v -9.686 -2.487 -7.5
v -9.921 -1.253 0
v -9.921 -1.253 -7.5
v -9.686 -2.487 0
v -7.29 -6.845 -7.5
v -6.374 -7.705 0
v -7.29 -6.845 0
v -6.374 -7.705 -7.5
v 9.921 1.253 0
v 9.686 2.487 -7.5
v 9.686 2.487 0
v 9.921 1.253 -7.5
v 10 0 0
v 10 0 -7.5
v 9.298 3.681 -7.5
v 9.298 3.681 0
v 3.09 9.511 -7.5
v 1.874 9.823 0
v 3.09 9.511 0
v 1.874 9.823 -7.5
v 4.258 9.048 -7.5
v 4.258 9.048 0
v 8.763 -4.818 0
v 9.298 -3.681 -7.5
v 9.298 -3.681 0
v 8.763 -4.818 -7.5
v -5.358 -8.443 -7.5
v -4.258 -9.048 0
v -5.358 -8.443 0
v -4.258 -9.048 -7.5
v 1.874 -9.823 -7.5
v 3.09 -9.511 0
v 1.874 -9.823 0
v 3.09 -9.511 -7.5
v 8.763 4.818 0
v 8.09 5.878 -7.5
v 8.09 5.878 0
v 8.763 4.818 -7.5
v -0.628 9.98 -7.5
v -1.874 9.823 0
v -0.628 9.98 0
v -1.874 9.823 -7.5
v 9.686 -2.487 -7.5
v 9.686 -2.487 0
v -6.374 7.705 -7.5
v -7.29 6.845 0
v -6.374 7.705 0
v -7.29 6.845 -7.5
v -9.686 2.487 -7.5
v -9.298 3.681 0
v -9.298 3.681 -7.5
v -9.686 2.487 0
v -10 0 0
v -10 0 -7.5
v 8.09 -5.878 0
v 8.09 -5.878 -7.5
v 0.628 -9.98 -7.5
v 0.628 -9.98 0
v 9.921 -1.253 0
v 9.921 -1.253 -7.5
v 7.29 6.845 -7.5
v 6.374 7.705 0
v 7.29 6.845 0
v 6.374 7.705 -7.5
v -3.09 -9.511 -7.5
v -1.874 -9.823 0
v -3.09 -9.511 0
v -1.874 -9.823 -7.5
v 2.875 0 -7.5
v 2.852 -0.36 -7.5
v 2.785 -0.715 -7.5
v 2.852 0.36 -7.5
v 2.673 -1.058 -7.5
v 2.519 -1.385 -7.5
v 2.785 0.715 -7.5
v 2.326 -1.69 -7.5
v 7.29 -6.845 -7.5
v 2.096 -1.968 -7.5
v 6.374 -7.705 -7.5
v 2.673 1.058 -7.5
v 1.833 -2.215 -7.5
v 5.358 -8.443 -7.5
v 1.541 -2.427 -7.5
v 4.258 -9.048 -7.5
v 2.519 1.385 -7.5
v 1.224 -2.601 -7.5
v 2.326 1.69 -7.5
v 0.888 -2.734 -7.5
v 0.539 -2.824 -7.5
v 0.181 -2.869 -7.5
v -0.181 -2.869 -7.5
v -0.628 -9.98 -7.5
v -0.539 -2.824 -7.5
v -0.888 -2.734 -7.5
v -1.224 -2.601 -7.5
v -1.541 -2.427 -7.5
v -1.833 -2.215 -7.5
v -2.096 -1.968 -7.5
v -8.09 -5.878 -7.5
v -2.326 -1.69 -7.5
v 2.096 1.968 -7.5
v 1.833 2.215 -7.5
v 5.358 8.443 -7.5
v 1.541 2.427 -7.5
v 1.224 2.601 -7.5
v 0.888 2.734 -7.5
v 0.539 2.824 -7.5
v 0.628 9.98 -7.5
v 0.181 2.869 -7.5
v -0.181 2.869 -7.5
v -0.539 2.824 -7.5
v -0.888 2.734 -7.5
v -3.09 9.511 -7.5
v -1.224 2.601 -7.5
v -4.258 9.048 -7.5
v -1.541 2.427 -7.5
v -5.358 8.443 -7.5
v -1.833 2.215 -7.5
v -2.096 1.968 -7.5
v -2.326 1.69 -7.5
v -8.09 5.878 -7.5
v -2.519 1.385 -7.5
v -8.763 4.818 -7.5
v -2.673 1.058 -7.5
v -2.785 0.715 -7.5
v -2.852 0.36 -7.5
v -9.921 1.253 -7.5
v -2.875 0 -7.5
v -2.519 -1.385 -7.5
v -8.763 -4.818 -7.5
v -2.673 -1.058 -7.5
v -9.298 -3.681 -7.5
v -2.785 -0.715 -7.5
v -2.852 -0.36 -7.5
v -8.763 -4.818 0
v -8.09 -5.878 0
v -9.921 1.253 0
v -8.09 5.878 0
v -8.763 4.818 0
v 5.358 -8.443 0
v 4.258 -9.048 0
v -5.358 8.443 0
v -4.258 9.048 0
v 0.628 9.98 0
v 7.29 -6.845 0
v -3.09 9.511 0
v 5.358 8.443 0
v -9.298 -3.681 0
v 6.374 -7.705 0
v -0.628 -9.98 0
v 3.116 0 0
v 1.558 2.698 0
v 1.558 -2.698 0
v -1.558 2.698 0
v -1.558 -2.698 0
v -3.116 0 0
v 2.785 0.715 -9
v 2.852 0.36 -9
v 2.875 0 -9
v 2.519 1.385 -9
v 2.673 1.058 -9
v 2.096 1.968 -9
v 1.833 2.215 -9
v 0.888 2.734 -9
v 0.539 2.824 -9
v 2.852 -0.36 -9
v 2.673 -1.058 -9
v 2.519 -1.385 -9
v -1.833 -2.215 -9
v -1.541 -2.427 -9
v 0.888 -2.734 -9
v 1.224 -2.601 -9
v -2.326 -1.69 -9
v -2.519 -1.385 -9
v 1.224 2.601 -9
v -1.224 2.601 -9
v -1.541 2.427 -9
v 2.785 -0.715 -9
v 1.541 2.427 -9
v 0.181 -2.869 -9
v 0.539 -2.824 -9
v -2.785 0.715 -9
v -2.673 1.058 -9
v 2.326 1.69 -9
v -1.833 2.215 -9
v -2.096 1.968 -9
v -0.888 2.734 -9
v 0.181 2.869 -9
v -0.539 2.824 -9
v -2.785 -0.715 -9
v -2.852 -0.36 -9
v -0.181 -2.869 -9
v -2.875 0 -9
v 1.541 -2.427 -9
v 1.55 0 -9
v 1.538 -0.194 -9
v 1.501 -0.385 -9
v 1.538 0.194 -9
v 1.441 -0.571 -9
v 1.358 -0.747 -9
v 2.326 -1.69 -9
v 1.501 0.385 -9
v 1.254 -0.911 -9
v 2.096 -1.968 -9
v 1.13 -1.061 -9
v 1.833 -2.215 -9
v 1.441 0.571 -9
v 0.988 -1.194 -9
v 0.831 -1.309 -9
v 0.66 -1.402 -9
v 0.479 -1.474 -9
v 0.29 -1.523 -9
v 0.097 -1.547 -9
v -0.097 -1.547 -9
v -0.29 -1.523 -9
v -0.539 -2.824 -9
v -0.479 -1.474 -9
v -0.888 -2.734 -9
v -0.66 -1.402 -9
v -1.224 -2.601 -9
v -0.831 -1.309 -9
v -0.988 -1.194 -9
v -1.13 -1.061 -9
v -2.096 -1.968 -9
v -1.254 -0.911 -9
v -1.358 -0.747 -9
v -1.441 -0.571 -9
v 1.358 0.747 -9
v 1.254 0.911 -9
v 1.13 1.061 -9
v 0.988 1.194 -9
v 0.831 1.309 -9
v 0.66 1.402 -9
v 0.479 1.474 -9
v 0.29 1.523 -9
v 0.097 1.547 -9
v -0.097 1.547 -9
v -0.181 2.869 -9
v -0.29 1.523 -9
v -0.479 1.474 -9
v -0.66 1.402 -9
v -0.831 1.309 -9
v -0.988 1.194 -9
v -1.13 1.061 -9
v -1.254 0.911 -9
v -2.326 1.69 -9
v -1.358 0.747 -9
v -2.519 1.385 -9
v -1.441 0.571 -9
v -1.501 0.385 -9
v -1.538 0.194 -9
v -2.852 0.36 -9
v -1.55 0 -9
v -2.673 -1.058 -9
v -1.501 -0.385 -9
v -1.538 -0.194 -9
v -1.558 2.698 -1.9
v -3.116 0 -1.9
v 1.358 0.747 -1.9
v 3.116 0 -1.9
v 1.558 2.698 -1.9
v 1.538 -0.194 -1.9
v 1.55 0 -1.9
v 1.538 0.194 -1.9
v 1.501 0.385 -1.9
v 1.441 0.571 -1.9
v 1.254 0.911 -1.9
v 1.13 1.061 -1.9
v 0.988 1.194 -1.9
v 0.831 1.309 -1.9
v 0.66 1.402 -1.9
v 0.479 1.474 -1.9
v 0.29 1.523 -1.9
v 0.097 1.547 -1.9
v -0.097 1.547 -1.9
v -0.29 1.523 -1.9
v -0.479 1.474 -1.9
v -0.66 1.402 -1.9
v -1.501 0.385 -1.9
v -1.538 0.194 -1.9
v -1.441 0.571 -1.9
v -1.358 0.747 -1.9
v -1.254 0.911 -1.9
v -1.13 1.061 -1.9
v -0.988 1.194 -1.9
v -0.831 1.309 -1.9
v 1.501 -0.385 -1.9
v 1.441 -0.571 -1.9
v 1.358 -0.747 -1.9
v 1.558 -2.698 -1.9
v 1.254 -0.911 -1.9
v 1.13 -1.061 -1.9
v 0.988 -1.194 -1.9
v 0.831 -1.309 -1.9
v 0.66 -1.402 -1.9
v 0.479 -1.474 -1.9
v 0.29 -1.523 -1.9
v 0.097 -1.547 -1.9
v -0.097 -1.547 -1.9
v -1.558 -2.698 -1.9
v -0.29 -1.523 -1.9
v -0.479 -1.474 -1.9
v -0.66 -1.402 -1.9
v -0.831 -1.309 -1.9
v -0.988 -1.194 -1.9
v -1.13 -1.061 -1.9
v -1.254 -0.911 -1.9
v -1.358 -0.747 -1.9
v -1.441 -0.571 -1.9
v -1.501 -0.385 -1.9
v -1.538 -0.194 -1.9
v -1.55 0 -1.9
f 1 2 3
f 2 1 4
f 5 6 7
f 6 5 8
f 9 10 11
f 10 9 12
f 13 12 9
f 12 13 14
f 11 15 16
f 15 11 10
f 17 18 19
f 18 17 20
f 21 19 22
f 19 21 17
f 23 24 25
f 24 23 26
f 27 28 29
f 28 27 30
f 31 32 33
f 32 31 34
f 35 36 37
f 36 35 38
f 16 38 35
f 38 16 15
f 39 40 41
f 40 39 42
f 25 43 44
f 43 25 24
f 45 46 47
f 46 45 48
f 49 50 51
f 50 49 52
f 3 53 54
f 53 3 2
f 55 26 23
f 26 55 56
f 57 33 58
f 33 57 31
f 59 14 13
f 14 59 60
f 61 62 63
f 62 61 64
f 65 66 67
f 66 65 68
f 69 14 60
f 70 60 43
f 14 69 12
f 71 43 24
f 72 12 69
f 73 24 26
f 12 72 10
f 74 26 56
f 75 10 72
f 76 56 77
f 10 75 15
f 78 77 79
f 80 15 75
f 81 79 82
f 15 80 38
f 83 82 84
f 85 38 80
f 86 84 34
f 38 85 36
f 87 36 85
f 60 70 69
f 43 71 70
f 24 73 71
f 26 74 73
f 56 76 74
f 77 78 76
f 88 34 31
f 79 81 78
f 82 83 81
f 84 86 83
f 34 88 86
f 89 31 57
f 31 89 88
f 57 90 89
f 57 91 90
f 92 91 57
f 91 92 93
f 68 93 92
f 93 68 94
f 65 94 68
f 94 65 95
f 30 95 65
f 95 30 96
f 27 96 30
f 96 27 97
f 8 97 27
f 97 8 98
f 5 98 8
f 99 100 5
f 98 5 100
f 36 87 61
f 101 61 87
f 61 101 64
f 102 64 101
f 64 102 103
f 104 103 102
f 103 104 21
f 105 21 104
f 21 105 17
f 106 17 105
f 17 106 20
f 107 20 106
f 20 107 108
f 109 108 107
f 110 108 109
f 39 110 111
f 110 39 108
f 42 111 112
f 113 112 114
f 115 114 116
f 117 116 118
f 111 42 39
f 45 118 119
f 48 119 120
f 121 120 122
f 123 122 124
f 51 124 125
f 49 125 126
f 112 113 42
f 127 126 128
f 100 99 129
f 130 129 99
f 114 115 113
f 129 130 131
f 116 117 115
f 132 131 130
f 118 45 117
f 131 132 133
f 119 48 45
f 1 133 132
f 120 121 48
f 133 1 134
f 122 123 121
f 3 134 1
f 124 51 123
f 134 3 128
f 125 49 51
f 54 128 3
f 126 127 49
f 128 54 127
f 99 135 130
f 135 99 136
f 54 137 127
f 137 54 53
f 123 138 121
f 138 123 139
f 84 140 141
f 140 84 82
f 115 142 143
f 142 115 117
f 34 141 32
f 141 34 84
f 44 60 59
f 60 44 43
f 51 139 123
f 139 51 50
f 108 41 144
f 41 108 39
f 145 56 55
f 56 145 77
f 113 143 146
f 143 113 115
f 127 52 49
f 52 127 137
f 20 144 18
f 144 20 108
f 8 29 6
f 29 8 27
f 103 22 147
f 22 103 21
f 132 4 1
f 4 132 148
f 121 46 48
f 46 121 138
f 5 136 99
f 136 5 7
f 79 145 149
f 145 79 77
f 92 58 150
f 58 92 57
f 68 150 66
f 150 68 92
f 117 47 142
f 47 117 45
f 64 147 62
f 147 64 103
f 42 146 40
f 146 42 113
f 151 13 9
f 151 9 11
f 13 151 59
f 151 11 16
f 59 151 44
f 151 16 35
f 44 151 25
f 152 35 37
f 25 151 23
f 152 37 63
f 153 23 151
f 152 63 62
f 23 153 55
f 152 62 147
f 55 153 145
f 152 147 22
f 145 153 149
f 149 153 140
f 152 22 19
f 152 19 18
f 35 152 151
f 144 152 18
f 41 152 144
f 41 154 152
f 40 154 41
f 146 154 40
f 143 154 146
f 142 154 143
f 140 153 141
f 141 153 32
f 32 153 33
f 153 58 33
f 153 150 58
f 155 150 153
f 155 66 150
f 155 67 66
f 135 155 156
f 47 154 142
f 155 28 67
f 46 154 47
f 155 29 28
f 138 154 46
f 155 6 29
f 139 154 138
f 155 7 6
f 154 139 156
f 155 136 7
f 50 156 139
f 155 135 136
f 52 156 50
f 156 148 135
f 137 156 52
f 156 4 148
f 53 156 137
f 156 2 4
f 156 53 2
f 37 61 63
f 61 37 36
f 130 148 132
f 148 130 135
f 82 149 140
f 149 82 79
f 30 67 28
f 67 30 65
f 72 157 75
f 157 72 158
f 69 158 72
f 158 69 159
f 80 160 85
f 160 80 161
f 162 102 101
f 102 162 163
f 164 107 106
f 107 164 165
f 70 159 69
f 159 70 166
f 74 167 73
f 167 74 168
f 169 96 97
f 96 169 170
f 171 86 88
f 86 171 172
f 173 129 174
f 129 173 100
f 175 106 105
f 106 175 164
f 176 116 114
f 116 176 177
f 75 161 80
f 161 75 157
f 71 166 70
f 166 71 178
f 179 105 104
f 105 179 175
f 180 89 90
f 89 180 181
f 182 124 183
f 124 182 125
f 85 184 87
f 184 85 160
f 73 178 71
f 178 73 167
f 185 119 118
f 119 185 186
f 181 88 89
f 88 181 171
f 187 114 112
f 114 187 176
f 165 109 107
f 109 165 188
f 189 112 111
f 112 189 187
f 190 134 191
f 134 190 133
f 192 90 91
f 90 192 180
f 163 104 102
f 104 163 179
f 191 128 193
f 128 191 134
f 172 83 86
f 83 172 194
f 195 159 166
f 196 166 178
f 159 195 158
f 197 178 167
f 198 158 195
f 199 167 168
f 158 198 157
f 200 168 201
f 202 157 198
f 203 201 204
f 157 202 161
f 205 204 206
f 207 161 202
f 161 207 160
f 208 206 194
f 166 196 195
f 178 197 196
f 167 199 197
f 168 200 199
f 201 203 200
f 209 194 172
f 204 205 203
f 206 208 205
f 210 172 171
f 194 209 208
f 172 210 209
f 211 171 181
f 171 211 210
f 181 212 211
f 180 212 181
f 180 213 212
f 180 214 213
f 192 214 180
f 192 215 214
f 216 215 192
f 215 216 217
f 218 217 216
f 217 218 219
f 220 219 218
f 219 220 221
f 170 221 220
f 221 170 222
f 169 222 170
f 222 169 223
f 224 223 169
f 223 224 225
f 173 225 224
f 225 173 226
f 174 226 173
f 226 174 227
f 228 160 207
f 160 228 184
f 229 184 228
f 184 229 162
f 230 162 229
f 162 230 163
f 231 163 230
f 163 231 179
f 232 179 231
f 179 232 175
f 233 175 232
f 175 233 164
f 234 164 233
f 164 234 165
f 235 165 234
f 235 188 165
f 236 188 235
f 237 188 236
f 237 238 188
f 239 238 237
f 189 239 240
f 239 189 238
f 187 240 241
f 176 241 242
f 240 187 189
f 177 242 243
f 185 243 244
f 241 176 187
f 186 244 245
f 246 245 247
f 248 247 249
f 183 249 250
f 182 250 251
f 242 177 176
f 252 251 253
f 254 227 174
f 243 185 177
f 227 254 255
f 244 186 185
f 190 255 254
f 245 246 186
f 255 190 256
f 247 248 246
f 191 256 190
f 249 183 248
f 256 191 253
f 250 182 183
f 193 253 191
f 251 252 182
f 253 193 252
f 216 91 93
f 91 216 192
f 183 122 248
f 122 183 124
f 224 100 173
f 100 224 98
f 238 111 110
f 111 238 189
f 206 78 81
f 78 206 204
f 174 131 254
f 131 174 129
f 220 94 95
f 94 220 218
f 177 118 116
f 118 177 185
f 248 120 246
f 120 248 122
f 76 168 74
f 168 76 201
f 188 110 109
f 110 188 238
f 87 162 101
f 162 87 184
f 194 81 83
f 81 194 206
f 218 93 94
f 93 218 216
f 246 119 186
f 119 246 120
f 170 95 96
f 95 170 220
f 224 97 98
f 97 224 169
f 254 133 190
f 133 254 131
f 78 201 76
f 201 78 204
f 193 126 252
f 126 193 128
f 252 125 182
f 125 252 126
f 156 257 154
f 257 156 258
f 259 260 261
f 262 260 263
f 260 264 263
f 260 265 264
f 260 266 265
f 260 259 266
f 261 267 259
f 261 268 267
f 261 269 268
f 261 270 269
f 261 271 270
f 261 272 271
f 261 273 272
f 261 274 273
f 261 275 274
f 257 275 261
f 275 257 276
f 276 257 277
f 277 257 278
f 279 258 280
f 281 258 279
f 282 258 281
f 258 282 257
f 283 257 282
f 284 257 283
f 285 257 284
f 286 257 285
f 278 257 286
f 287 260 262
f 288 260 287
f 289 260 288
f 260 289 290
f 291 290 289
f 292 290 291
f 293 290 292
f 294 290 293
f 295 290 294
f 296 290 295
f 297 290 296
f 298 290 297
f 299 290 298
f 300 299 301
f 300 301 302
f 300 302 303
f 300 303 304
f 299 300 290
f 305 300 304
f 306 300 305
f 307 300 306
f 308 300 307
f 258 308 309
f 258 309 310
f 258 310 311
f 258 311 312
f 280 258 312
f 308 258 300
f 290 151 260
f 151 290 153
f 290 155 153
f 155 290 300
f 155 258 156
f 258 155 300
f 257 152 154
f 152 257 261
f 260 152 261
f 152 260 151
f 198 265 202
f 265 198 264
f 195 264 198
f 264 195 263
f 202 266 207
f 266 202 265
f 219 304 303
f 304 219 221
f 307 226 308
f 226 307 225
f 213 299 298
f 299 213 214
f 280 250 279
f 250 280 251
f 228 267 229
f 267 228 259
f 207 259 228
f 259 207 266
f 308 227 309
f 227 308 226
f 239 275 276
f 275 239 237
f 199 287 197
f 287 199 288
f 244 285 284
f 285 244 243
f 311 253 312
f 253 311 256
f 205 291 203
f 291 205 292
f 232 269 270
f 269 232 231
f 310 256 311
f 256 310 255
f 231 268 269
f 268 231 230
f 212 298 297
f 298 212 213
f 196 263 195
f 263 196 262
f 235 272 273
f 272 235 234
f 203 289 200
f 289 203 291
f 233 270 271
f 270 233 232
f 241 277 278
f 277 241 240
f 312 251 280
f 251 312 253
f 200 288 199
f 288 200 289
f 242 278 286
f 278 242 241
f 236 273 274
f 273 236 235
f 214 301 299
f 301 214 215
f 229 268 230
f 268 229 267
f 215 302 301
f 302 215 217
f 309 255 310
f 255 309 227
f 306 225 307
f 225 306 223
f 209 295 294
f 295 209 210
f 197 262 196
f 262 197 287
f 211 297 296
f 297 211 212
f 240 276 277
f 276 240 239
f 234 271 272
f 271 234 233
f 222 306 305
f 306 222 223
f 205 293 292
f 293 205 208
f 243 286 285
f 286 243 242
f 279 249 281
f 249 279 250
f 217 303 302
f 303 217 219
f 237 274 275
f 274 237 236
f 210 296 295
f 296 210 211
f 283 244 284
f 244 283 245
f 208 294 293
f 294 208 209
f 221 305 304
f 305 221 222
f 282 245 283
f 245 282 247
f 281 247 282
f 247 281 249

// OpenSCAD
$fn = 50;

difference() {
	union() {
		translate(v = [0, 0, -7.5]) {
			cylinder(h = 7.5, r = 10.0);
		}
		#translate(v = [0, 0, -9.0]) {
			cylinder(h = 9, r = 2.875);
		}
	}
	union() {
		translate(v = [0, 0, 0]) {
			rotate(a = [0, 0, 0]) {
				difference() {
					union() {
						translate(v = [0, 0, -1.9]) {
							linear_extrude(height = 1.9) {
								polygon(points = [[3.1158, 0.0], [1.5579000000000005, 2.698361953111554], [-1.5578999999999994, 2.6983619531115544], [-3.1158, 3.815754496783323e-16], [-1.5579000000000014, -2.6983619531115535], [1.557899999999998, -2.6983619531115552]]);
							}
						}
					}
					union();
				}
			}
		}
		#translate(v = [0, 0, -100.0]) {
			cylinder(h = 200, r = 1.55);
		}
	}
}
